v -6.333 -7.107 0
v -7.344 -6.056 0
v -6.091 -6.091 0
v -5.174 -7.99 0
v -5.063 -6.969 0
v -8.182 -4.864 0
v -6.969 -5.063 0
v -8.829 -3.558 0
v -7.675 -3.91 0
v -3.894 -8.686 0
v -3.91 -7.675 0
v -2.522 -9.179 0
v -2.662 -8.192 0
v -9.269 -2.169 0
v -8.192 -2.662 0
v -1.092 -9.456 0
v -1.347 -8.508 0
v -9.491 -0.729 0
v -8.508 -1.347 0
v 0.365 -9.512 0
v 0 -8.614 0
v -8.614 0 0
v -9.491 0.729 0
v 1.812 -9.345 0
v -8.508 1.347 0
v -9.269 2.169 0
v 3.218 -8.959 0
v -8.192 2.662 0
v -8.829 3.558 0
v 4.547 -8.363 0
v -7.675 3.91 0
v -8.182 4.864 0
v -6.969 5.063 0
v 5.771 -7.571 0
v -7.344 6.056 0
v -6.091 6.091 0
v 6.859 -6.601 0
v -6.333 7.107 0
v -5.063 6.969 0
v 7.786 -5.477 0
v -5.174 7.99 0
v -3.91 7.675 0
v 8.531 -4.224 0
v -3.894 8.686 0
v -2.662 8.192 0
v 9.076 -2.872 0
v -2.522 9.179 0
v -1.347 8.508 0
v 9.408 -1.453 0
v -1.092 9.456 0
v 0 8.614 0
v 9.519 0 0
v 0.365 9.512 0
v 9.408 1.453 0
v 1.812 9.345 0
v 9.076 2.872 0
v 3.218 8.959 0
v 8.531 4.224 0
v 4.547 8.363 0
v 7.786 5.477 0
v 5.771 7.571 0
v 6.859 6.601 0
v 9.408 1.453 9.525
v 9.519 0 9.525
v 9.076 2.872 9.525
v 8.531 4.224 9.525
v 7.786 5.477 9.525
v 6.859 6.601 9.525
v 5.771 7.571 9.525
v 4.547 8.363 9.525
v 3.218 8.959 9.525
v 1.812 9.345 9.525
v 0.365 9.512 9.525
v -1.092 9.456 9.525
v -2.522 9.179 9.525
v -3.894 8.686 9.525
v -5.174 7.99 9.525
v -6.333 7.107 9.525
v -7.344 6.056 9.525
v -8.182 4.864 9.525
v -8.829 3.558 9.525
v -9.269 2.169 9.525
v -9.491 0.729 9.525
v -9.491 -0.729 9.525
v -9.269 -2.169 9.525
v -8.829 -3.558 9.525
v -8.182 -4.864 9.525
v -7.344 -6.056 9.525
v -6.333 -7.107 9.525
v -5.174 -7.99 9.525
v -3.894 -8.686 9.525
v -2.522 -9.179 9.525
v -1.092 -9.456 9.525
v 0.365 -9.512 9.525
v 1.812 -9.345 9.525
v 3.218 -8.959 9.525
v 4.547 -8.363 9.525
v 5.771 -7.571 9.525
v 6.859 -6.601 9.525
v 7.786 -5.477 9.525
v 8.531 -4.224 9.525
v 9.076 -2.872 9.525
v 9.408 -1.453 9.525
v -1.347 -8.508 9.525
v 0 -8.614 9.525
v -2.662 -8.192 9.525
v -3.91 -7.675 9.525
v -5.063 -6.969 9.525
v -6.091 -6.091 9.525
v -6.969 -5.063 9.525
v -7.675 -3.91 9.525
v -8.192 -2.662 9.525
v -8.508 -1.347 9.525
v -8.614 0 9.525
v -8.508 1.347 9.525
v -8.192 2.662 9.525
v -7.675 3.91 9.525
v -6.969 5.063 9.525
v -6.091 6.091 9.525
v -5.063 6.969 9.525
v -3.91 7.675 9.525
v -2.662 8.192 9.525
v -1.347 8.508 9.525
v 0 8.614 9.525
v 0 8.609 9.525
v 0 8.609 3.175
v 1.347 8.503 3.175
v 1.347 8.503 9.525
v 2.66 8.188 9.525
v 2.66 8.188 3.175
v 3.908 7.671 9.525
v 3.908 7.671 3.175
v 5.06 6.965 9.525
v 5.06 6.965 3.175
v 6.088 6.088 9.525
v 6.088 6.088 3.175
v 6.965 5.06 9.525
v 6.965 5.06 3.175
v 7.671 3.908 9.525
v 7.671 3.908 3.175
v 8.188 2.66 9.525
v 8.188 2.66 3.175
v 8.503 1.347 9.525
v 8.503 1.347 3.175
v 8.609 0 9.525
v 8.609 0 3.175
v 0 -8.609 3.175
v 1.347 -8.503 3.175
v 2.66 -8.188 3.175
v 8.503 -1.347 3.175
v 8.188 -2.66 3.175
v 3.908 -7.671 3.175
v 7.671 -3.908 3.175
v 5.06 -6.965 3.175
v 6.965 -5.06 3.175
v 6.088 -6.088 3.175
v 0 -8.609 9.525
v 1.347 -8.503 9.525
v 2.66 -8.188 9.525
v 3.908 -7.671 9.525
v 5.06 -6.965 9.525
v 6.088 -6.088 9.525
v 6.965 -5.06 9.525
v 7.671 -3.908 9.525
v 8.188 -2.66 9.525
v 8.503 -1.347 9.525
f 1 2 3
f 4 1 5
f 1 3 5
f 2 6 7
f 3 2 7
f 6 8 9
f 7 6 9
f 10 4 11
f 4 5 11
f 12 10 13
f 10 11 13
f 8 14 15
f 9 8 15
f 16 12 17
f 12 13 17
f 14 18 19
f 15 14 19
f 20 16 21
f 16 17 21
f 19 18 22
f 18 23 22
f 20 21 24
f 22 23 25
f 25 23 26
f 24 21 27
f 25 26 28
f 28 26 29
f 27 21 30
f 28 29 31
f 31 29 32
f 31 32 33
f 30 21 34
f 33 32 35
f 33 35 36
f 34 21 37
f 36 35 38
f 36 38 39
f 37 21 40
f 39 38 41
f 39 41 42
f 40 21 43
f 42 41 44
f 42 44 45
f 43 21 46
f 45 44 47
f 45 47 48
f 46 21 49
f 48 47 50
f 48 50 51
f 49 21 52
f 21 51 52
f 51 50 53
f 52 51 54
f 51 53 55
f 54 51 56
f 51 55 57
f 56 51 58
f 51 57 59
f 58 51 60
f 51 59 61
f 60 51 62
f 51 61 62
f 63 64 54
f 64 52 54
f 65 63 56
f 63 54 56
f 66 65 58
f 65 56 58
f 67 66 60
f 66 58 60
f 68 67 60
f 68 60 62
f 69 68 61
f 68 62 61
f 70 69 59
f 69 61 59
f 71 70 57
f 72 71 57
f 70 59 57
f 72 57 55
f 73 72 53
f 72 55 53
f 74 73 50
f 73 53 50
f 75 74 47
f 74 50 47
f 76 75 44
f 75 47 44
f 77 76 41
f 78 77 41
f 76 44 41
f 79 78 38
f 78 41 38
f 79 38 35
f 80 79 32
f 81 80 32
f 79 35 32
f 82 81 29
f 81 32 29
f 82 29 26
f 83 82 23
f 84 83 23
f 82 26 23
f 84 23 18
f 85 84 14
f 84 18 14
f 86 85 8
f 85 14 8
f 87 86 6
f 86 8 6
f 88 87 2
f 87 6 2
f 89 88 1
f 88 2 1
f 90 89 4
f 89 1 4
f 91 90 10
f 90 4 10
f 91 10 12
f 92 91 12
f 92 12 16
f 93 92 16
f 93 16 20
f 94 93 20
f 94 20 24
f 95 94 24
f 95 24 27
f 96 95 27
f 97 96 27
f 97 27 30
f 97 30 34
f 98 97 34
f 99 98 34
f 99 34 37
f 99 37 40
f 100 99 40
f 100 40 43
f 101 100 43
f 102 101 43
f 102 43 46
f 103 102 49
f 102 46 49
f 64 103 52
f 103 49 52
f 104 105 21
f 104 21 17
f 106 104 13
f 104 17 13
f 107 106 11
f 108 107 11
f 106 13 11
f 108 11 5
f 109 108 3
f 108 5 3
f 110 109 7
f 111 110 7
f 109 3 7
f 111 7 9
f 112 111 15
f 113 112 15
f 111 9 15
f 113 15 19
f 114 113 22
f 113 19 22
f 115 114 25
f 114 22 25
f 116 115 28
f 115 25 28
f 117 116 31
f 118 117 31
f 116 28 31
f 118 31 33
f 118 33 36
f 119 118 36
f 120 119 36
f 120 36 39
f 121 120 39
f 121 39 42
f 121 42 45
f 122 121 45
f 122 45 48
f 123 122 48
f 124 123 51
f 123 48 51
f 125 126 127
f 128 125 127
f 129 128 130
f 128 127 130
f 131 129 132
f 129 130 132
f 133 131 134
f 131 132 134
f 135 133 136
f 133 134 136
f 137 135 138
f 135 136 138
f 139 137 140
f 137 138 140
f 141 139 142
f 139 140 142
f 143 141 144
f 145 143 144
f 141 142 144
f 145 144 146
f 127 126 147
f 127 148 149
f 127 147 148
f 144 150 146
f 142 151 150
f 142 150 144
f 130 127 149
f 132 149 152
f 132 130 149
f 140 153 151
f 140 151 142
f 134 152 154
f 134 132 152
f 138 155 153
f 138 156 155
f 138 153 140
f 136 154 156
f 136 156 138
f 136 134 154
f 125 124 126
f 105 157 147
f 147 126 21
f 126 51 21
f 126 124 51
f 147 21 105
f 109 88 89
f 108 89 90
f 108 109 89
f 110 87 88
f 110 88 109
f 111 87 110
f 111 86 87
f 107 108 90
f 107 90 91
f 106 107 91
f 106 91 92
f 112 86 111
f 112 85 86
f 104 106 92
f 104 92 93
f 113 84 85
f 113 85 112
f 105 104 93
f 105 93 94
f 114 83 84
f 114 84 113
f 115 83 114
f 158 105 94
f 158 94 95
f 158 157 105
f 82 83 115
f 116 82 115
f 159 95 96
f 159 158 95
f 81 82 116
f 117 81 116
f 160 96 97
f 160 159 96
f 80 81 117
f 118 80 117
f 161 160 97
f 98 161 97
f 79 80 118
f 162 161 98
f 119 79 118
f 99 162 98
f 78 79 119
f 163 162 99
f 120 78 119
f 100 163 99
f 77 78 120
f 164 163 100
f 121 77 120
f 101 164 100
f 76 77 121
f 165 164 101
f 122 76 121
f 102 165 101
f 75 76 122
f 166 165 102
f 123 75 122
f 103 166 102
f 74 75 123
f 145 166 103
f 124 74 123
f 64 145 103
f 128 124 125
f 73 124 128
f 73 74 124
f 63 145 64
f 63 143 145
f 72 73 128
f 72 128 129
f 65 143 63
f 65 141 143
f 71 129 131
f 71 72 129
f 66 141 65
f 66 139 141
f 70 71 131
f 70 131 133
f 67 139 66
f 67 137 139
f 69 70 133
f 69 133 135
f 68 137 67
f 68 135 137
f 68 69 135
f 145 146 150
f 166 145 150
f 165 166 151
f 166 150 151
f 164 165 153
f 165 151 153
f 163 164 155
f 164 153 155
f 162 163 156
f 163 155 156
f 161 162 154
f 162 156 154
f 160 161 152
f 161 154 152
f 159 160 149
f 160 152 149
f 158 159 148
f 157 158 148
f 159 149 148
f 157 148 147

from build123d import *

# Parameters (mm, degrees)
F0_R     = 9.5191370384
F1_DEPTH = 3.175
F2_R     = 9.5191370384
F3_DEPTH = 6.35


with BuildPart() as f1:
    # F0 (on Top) → F1 (new body)
    with BuildSketch(Plane.XY):
        Circle(F0_R)
        with BuildLine():
            ThreePointArc((0, 8.6135921563), (6.0907294241, 6.0907294241), (8.6135921563, 0))
            ThreePointArc((8.6135921563, 0), (6.0907294241, -6.0907294241), (0, -8.6135921563))
            ThreePointArc((0, -8.6135921563), (-8.6135921563, 0), (0, 8.6135921563))
        make_face(mode=Mode.SUBTRACT)
        with BuildLine():
            ThreePointArc((0, -8.6135921563), (6.0907294241, -6.0907294241), (8.6135921563, 0))
            ThreePointArc((8.6135921563, 0), (6.0907294241, 6.0907294241), (0, 8.6135921563))
            Line((0, 8.6135921563), (0, -8.6135921563))
        make_face()
    extrude(amount=F1_DEPTH)

    # F2 (on face) → F3 (join)
    with BuildSketch(Plane.XY.offset(3.175)):
        Circle(F2_R)
        with BuildLine():
            ThreePointArc((0, 8.6092061915), (6.0876280786, 6.0876280786), (8.6092061915, 0))
            ThreePointArc((8.6092061915, 0), (6.0876280786, -6.0876280786), (0, -8.6092061915))
            Line((0, -8.6092061915), (0, -8.6135921563))
            ThreePointArc((0, -8.6135921563), (-8.6135921563, 0), (0, 8.6135921563))
            Line((0, 8.6135921563), (0, 8.6092061915))
        make_face(mode=Mode.SUBTRACT)
    extrude(amount=F3_DEPTH)


solid = f1.part
